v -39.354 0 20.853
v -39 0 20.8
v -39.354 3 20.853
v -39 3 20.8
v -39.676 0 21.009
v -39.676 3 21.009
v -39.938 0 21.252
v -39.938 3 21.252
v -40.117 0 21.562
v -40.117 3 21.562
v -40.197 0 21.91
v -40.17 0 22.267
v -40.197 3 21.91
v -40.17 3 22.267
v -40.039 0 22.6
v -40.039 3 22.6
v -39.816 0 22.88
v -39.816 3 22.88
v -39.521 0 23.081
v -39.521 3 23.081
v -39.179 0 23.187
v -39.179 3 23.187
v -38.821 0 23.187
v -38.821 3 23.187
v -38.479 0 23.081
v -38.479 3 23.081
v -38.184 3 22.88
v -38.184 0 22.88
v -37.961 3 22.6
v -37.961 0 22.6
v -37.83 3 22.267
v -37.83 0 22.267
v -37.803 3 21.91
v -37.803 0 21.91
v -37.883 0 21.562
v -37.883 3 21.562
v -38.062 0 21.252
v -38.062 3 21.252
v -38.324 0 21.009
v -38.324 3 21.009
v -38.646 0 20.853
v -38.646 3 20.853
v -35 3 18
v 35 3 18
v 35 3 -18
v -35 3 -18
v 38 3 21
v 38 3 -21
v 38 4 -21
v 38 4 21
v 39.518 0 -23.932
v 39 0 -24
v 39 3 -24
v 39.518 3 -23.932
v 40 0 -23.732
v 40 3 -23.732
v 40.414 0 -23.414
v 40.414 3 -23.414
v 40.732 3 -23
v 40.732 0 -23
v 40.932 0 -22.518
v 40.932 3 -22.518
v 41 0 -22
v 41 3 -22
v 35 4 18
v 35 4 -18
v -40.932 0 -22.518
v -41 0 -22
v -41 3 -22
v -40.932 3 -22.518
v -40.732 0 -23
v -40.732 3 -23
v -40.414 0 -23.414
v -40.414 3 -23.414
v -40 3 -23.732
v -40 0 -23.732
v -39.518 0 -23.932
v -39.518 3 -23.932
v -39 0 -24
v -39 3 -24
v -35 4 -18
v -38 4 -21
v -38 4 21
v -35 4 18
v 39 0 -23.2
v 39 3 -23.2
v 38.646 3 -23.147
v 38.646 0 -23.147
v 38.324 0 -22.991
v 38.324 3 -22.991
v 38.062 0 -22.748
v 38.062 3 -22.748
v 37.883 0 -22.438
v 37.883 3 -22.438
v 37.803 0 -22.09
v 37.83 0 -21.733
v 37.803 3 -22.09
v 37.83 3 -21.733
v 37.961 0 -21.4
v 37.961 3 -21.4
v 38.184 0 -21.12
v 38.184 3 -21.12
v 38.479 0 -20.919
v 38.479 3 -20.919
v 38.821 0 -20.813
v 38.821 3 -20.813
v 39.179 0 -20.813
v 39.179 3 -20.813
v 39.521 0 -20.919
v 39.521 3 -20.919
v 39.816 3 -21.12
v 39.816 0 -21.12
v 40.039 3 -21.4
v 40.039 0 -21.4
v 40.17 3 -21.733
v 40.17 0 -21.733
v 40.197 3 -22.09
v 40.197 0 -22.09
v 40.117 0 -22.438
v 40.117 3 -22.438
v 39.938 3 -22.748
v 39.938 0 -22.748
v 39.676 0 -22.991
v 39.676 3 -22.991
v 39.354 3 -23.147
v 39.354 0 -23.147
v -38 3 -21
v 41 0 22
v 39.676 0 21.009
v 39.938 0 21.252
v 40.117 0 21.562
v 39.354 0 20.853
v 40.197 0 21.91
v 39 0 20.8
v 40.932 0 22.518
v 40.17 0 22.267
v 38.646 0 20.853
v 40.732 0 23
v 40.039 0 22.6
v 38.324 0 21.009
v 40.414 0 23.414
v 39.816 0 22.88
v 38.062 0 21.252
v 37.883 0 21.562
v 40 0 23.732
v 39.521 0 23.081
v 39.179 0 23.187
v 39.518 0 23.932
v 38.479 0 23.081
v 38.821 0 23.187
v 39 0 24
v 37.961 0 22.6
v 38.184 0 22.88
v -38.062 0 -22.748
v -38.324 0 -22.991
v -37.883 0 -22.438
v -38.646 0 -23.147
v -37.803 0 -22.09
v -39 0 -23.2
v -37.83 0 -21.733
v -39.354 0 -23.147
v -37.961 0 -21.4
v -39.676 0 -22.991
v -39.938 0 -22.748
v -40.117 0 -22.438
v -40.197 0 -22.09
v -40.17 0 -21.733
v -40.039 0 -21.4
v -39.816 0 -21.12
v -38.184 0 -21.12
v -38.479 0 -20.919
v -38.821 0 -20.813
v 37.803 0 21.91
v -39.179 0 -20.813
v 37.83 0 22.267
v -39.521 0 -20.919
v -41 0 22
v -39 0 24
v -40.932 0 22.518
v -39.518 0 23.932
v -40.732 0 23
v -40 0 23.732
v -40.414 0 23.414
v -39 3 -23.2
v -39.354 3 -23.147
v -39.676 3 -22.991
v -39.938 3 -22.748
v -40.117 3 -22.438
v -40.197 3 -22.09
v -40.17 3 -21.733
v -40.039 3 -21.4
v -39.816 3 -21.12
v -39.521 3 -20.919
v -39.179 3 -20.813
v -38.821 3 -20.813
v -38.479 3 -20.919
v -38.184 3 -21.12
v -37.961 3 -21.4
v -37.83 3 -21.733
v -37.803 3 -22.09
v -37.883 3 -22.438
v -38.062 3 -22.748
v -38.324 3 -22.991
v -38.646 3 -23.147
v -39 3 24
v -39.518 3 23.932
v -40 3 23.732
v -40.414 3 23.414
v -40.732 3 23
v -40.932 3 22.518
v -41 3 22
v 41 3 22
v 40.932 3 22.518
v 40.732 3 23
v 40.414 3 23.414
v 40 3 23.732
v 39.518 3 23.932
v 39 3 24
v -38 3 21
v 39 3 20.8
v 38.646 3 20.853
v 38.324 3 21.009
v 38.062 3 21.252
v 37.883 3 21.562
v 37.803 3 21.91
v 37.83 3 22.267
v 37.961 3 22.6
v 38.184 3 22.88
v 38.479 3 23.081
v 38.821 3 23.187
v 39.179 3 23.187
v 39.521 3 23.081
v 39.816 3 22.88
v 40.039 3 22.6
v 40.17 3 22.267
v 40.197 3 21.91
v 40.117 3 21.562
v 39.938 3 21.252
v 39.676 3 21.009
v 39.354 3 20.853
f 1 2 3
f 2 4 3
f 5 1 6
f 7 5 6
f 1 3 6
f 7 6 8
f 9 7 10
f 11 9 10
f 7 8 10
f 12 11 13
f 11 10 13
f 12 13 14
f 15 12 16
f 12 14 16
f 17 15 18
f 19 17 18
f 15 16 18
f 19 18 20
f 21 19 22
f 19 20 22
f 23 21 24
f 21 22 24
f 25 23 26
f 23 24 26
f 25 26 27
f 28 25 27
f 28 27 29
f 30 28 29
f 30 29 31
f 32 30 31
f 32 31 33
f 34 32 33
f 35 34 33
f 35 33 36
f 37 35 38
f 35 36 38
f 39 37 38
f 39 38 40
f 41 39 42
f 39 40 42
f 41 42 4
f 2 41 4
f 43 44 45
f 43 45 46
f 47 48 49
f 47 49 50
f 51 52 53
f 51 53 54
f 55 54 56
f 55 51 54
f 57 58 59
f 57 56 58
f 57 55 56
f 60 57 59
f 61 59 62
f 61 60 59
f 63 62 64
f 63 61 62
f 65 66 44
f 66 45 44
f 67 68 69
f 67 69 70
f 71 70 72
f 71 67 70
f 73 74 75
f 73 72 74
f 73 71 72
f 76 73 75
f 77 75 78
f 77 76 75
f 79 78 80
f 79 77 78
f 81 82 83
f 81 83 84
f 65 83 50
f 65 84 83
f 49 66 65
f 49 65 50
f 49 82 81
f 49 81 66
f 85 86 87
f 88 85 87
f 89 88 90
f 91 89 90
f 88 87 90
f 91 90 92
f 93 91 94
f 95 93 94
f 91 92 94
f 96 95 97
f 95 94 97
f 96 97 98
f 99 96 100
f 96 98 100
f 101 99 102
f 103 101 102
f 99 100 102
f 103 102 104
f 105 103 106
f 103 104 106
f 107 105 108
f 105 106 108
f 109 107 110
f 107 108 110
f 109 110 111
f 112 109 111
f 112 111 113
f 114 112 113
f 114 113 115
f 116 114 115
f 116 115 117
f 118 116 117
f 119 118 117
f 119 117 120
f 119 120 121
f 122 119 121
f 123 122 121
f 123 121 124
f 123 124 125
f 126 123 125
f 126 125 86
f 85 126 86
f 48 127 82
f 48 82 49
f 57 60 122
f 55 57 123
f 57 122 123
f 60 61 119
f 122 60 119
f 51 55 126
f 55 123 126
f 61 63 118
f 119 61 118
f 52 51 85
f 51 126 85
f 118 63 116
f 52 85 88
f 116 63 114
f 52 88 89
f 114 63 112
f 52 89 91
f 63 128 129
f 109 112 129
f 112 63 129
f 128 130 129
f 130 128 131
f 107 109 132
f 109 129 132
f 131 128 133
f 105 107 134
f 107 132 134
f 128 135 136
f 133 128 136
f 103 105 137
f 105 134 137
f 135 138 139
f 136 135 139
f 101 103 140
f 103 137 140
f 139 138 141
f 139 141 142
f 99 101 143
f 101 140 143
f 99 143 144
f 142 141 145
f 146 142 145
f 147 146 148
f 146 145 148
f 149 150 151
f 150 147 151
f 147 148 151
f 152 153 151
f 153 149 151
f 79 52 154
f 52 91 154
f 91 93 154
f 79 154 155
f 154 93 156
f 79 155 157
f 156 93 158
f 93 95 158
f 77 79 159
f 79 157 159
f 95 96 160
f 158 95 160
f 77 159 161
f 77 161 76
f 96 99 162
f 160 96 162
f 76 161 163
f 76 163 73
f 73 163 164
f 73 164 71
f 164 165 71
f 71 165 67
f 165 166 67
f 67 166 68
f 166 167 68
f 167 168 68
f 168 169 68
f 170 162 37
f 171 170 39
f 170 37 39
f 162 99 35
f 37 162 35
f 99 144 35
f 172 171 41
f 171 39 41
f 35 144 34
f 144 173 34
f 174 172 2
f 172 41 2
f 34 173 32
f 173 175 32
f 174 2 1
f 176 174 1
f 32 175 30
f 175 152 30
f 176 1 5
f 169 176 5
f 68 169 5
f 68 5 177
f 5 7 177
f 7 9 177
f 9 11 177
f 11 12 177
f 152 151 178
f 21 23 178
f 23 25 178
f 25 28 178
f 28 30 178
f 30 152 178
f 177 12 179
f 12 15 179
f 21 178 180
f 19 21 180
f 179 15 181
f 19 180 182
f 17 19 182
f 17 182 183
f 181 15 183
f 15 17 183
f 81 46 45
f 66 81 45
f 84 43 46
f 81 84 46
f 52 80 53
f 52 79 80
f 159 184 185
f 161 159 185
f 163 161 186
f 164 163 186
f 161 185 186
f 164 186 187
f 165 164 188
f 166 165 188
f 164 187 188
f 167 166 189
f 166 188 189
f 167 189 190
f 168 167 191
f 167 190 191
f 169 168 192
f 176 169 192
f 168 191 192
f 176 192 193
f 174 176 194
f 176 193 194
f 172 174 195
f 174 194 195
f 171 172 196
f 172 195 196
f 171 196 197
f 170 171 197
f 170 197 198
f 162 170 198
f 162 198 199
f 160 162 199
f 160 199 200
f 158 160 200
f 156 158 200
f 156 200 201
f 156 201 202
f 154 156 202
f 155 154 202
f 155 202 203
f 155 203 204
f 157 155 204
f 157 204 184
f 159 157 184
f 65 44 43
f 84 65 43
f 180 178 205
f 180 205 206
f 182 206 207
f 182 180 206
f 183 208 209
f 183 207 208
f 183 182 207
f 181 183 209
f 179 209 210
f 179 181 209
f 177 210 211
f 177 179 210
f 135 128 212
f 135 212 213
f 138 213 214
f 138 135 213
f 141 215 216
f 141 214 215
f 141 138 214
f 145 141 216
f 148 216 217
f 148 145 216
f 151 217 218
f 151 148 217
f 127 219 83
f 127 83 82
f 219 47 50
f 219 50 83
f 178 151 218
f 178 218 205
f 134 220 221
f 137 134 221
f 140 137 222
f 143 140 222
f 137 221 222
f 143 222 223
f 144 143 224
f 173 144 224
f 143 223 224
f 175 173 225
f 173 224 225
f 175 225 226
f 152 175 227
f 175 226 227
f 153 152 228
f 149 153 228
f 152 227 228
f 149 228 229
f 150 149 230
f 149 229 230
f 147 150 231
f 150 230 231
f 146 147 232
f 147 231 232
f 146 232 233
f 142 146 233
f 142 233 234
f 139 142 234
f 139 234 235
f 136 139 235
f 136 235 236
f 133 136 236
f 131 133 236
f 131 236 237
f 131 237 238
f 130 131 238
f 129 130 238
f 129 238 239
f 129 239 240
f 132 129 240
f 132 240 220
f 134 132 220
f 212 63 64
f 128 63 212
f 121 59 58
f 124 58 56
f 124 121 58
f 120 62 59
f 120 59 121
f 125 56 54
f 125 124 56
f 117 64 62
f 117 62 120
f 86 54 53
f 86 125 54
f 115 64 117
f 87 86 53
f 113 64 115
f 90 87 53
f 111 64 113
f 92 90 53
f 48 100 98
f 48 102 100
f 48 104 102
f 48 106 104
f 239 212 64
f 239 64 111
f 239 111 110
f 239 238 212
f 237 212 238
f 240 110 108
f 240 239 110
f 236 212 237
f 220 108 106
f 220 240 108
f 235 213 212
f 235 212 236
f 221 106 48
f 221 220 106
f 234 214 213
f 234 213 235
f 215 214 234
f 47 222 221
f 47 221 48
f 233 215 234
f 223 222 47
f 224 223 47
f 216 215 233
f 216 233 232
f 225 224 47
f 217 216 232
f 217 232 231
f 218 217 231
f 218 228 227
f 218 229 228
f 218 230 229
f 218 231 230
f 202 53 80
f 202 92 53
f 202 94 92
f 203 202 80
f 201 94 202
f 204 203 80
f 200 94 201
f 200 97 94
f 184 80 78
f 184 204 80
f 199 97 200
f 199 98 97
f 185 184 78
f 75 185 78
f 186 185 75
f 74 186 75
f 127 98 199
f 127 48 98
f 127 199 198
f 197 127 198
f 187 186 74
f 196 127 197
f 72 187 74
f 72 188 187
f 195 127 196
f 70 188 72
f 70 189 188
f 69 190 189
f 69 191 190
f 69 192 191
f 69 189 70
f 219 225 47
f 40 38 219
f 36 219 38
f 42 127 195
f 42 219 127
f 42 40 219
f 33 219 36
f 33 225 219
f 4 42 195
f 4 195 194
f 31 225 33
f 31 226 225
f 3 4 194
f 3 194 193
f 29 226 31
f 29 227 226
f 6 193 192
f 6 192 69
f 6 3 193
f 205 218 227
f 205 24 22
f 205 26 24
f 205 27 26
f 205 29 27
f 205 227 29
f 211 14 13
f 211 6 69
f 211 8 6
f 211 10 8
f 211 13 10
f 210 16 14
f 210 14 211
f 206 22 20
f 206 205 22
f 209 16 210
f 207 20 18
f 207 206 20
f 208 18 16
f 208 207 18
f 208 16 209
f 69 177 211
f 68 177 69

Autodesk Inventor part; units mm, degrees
ref_plane "YZ Plane" through (0, 0, 0) normal (1, 0, 0) x (0, 1, 0)
ref_plane "XZ Plane" through (0, 0, 0) normal (0, 1, 0) x (-1, 0, 0)
ref_plane "XY Plane" through (0, 0, 0) normal (0, 0, 1) x (1, 0, 0)
sketch "Boceto1" plane through (0, 0, 0) normal (0, 1, 0) x (-1, 0, 0)
  line L0 (-39, 24) -> (39, 24)
  line L1 (41, 22) -> (41, -22)
  line L2 (39, -24) -> (-39, -24)
  line L3 (-41, -22) -> (-41, 22)
  line L4 (-41, 24) -> (41, -24) construction
  line L5 (41, 24) -> (-41, -24) construction
  arc A0 (39, -24) -> (41, -22) centre (39, -22) ccw
  arc A1 (-41, -22) -> (-39, -24) centre (-39, -22) ccw
  arc A2 (-39, 24) -> (-41, 22) centre (-39, 22) ccw
  arc A3 (41, 22) -> (39, 24) centre (39, 22) ccw
  point P0 (0, 0)
  dimension "d0" = 82
  dimension "d1" = 48
  dimension "d2" = 2
extrude "Extrusión1" add sketch "Boceto1" along normal blind 3
sketch "Boceto2" plane through (0, 3, 0) normal (0, 1, 0) x (1, 0, 0)
  line L0 (38, -21) -> (-38, -21)
  line L1 (-38, -21) -> (-38, 21)
  line L2 (-38, 21) -> (38, 21)
  line L3 (38, 21) -> (38, -21)
  line L4 (38, -21) -> (-38, 21) construction
  line L5 (-38, -21) -> (38, 21) construction
  line L6 (39, 24) -> (-39, 24) projected
  line L7 (41, -22) -> (41, 22) projected
  line L8 (35, -18) -> (-35, -18)
  line L9 (-35, -18) -> (-35, 18)
  line L10 (-35, 18) -> (35, 18)
  line L11 (35, 18) -> (35, -18)
  line L12 (35, -18) -> (-35, 18) construction
  line L13 (-35, -18) -> (35, 18) construction
  point P0 (0, 0)
  dimension "d5" = 3
  dimension "d6" = 3
  dimension "d7" = 3
  dimension "d8" = 3
extrude "Extrusión2" add sketch "Boceto2" along normal blind 1
sketch "Boceto3" plane through (0, 0, 0) normal (0, -1, 0) x (1, 0, 0)
  point P0 (-39, 22)
hole "Agujero1" at (-39, 0, 22) direction (0, 1, 0) diameter 2.4 end through all
sketch "Boceto4" plane through (0, 0, 0) normal (0, -1, 0) x (1, 0, 0)
  point P0 (-39, -22)
hole "Agujero2" at (-39, 0, -22) direction (0, 1, 0) diameter 2.4 end through all
sketch "Boceto5" plane through (0, 0, 0) normal (0, -1, 0) x (1, 0, 0)
  point P0 (39, 22)
hole "Agujero3" at (39, 0, 22) direction (0, 1, 0) diameter 2.4 end through all
sketch "Boceto6" plane through (0, 0, 0) normal (0, -1, 0) x (1, 0, 0)
  point P0 (39, -22)
hole "Agujero4" at (39, 0, -22) direction (0, 1, 0) diameter 2.4 end through all
properties part number "Tapa principal" material "Plástico PET"
